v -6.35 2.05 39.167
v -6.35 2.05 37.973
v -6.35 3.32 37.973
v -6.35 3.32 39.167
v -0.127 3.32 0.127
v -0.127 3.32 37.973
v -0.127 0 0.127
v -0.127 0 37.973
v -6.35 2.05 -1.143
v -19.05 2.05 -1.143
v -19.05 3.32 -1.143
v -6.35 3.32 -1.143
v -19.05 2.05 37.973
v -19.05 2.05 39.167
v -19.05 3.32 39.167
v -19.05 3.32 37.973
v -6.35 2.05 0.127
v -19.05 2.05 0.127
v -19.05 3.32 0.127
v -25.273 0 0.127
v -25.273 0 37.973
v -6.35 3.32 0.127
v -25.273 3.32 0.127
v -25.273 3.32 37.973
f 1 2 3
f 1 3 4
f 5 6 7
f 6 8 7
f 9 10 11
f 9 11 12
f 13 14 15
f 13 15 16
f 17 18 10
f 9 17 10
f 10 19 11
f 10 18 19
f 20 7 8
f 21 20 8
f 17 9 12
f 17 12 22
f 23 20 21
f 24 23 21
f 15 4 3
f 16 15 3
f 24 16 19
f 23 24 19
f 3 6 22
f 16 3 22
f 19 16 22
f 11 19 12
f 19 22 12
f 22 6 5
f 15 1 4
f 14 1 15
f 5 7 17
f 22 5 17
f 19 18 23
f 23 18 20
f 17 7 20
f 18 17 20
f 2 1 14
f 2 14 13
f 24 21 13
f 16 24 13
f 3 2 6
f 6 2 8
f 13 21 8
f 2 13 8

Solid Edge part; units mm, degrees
sketch "Sketch1" plane through (0, 0, 0) normal (0, -1, 0) x (1, 0, 0)
  line L0 (-0.127, 0.127) -> (-25.273, 0.127)
  line L1 (-25.273, 0.127) -> (-25.273, 37.973)
  line L2 (-25.273, 37.973) -> (-0.127, 37.973)
  line L3 (-0.127, 37.973) -> (-0.127, 0.127)
extrude "Protrusion1" add sketch "Sketch1" against normal up to surface (2.05 mm away)
sketch "Sketch2" plane through (-9.78, 2.05, 19.05) normal (0, 1, 0) x (1, 0, 0)
  line L0 (-9.27, 20.193) -> (3.43, 20.193)
  line L1 (3.43, 20.193) -> (3.43, 18.923)
  line L2 (9.653, 18.923) -> (3.43, 18.923)
  line L3 (9.653, -18.923) -> (9.653, 18.923)
  line L4 (3.43, -18.923) -> (9.653, -18.923)
  line L5 (3.43, -18.923) -> (3.43, -20.1168)
  line L6 (3.43, -20.1168) -> (-9.27, -20.1168)
  line L7 (-9.27, -20.1168) -> (-9.27, -18.923)
  line L8 (-15.493, -18.923) -> (-9.27, -18.923)
  line L9 (-15.493, 18.923) -> (-15.493, -18.923)
  line L10 (-9.27, 18.923) -> (-15.493, 18.923)
  line L11 (-9.27, 18.923) -> (-9.27, 20.193)
extrude "Protrusion2" add sketch "Sketch2" along normal blind 1.27
